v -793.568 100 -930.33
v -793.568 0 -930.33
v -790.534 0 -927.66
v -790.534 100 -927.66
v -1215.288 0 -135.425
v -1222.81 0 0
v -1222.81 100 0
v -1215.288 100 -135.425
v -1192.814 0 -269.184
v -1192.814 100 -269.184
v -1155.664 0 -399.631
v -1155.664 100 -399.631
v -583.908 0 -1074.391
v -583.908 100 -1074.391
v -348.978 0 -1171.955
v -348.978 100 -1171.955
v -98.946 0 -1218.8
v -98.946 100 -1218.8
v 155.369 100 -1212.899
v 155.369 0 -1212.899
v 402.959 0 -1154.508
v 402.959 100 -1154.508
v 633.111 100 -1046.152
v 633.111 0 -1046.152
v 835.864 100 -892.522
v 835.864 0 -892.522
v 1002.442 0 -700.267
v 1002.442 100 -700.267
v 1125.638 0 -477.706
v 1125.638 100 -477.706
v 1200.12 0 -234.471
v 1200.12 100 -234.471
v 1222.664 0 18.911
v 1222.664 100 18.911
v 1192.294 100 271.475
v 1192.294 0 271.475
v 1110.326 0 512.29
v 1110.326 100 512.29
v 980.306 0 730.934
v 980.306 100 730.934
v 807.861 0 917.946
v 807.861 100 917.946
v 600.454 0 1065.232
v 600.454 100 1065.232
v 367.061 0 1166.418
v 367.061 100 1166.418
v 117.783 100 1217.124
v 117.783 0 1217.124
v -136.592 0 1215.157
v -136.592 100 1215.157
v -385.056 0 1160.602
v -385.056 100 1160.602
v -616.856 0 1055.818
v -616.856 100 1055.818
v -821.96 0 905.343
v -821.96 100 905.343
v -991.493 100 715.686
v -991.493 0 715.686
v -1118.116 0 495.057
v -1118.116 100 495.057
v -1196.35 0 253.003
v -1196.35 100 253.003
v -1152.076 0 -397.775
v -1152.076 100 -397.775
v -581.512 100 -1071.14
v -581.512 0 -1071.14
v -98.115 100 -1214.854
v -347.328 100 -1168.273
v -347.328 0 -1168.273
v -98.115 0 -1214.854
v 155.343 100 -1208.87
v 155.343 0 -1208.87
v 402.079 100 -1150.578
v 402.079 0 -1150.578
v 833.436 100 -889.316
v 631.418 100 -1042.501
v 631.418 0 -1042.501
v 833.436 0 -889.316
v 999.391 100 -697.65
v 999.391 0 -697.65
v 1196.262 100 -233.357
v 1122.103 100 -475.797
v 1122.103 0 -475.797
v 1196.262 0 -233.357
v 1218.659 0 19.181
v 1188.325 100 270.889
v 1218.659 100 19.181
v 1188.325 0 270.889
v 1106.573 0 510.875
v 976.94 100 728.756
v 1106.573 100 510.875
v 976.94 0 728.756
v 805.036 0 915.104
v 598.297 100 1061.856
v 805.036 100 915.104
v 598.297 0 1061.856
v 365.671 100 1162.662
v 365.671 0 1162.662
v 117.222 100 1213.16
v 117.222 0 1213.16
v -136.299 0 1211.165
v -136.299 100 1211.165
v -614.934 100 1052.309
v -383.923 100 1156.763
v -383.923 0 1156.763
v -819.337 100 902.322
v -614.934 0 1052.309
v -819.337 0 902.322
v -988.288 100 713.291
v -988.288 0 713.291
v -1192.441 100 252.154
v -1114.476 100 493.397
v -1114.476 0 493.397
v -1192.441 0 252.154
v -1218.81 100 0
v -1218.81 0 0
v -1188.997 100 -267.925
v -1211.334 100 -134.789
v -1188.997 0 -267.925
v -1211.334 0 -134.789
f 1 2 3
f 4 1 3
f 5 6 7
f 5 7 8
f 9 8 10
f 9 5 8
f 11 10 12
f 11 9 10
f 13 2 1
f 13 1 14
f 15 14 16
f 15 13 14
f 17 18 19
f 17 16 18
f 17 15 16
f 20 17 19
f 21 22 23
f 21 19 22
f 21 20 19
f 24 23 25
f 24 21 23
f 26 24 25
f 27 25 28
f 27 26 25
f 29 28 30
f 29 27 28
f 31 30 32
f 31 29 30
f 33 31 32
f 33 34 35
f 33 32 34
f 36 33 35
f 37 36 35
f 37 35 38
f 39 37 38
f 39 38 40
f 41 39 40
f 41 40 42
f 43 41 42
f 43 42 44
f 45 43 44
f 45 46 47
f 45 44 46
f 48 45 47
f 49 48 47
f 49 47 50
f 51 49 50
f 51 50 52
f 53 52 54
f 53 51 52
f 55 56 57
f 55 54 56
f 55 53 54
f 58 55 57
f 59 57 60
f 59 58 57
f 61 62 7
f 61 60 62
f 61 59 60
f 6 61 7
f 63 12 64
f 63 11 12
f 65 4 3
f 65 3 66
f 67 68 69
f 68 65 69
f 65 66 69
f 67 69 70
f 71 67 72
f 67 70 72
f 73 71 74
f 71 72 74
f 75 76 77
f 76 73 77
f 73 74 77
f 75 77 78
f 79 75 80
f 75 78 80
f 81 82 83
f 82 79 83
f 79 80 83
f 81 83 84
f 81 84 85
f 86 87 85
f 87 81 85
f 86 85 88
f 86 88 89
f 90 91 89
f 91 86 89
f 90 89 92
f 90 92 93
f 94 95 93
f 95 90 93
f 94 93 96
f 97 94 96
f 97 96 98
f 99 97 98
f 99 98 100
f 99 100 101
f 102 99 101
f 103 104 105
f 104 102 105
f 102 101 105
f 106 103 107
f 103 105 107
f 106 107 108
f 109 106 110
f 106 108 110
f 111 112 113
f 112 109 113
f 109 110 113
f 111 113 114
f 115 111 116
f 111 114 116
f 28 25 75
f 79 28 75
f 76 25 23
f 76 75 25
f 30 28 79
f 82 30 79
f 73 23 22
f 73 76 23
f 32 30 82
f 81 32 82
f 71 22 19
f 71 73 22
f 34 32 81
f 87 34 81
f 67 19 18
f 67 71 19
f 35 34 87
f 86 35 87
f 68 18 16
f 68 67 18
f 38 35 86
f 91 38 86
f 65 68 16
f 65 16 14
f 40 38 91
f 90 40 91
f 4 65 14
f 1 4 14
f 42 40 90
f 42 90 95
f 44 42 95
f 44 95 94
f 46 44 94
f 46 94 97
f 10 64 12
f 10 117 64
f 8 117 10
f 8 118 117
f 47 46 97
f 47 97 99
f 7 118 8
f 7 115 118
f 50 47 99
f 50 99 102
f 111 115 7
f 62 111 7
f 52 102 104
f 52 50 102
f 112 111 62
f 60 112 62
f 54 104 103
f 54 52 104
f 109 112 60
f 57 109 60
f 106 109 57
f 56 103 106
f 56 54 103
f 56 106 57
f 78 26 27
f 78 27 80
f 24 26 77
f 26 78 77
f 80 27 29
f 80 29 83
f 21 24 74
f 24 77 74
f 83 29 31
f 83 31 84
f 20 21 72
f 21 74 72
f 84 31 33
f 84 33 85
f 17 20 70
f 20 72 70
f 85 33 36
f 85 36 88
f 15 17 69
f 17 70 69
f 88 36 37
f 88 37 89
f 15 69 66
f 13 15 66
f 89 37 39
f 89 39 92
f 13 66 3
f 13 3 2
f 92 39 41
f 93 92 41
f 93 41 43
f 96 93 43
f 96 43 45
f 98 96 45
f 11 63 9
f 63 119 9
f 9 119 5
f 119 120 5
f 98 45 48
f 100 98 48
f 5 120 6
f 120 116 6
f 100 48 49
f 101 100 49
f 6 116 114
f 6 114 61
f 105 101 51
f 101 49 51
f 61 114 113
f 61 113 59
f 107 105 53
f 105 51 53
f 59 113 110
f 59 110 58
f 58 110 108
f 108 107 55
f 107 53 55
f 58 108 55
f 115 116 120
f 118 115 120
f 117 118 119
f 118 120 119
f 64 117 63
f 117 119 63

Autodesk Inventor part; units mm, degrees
ref_plane "YZ Plane" through (0, 0, 0) normal (1, 0, 0) x (0, 1, 0)
ref_plane "XZ Plane" through (0, 0, 0) normal (0, 1, 0) x (-1, 0, 0)
ref_plane "XY Plane" through (0, 0, 0) normal (0, 0, 1) x (1, 0, 0)
sketch "Sketch1" plane through (0, 0, 0) normal (0, 1, 0) x (-1, 0, 0)
  circle A0 centre (0, 0) radius 1218.81
  circle A1 centre (0, 0) radius 1222.81
  dimension "d0" = 2437.62
  dimension "d1" = 2445.62
extrude "Extrusion1" add sketch "Sketch1" along normal blind 100
sketch "Sketch2" plane through (0, 0, 0) normal (0, -1, 0) x (1, 0, 0)
  line L0 (-1152.0758, -397.7746) -> (-847.4557, -240.1463) projected
  line L1 (-532.6414, -700.6187) -> (-790.0726, -927.2533) projected
  circle A0 centre (0, 0) radius 1222.81 projected
  line L2 (-793.5677, -930.3303) -> (-790.5345, -927.66)
  circle A1 centre (0, 0) radius 1218.81 projected
  line L3 (-1156.7304, -400.1831) -> (-1151.0362, -397.2366)
  point P0 (-1155.6639, -399.6313)
  point P1 (-1152.0738, -397.7735)
extrude "Extrusion2" cut sketch "Sketch2" against normal blind 100 contours A0 L3 A1 L2 picked at (-803.1153, -918.3043)
properties part number "Edge Band - Platform C Outer" material "Wood (Birch)"
